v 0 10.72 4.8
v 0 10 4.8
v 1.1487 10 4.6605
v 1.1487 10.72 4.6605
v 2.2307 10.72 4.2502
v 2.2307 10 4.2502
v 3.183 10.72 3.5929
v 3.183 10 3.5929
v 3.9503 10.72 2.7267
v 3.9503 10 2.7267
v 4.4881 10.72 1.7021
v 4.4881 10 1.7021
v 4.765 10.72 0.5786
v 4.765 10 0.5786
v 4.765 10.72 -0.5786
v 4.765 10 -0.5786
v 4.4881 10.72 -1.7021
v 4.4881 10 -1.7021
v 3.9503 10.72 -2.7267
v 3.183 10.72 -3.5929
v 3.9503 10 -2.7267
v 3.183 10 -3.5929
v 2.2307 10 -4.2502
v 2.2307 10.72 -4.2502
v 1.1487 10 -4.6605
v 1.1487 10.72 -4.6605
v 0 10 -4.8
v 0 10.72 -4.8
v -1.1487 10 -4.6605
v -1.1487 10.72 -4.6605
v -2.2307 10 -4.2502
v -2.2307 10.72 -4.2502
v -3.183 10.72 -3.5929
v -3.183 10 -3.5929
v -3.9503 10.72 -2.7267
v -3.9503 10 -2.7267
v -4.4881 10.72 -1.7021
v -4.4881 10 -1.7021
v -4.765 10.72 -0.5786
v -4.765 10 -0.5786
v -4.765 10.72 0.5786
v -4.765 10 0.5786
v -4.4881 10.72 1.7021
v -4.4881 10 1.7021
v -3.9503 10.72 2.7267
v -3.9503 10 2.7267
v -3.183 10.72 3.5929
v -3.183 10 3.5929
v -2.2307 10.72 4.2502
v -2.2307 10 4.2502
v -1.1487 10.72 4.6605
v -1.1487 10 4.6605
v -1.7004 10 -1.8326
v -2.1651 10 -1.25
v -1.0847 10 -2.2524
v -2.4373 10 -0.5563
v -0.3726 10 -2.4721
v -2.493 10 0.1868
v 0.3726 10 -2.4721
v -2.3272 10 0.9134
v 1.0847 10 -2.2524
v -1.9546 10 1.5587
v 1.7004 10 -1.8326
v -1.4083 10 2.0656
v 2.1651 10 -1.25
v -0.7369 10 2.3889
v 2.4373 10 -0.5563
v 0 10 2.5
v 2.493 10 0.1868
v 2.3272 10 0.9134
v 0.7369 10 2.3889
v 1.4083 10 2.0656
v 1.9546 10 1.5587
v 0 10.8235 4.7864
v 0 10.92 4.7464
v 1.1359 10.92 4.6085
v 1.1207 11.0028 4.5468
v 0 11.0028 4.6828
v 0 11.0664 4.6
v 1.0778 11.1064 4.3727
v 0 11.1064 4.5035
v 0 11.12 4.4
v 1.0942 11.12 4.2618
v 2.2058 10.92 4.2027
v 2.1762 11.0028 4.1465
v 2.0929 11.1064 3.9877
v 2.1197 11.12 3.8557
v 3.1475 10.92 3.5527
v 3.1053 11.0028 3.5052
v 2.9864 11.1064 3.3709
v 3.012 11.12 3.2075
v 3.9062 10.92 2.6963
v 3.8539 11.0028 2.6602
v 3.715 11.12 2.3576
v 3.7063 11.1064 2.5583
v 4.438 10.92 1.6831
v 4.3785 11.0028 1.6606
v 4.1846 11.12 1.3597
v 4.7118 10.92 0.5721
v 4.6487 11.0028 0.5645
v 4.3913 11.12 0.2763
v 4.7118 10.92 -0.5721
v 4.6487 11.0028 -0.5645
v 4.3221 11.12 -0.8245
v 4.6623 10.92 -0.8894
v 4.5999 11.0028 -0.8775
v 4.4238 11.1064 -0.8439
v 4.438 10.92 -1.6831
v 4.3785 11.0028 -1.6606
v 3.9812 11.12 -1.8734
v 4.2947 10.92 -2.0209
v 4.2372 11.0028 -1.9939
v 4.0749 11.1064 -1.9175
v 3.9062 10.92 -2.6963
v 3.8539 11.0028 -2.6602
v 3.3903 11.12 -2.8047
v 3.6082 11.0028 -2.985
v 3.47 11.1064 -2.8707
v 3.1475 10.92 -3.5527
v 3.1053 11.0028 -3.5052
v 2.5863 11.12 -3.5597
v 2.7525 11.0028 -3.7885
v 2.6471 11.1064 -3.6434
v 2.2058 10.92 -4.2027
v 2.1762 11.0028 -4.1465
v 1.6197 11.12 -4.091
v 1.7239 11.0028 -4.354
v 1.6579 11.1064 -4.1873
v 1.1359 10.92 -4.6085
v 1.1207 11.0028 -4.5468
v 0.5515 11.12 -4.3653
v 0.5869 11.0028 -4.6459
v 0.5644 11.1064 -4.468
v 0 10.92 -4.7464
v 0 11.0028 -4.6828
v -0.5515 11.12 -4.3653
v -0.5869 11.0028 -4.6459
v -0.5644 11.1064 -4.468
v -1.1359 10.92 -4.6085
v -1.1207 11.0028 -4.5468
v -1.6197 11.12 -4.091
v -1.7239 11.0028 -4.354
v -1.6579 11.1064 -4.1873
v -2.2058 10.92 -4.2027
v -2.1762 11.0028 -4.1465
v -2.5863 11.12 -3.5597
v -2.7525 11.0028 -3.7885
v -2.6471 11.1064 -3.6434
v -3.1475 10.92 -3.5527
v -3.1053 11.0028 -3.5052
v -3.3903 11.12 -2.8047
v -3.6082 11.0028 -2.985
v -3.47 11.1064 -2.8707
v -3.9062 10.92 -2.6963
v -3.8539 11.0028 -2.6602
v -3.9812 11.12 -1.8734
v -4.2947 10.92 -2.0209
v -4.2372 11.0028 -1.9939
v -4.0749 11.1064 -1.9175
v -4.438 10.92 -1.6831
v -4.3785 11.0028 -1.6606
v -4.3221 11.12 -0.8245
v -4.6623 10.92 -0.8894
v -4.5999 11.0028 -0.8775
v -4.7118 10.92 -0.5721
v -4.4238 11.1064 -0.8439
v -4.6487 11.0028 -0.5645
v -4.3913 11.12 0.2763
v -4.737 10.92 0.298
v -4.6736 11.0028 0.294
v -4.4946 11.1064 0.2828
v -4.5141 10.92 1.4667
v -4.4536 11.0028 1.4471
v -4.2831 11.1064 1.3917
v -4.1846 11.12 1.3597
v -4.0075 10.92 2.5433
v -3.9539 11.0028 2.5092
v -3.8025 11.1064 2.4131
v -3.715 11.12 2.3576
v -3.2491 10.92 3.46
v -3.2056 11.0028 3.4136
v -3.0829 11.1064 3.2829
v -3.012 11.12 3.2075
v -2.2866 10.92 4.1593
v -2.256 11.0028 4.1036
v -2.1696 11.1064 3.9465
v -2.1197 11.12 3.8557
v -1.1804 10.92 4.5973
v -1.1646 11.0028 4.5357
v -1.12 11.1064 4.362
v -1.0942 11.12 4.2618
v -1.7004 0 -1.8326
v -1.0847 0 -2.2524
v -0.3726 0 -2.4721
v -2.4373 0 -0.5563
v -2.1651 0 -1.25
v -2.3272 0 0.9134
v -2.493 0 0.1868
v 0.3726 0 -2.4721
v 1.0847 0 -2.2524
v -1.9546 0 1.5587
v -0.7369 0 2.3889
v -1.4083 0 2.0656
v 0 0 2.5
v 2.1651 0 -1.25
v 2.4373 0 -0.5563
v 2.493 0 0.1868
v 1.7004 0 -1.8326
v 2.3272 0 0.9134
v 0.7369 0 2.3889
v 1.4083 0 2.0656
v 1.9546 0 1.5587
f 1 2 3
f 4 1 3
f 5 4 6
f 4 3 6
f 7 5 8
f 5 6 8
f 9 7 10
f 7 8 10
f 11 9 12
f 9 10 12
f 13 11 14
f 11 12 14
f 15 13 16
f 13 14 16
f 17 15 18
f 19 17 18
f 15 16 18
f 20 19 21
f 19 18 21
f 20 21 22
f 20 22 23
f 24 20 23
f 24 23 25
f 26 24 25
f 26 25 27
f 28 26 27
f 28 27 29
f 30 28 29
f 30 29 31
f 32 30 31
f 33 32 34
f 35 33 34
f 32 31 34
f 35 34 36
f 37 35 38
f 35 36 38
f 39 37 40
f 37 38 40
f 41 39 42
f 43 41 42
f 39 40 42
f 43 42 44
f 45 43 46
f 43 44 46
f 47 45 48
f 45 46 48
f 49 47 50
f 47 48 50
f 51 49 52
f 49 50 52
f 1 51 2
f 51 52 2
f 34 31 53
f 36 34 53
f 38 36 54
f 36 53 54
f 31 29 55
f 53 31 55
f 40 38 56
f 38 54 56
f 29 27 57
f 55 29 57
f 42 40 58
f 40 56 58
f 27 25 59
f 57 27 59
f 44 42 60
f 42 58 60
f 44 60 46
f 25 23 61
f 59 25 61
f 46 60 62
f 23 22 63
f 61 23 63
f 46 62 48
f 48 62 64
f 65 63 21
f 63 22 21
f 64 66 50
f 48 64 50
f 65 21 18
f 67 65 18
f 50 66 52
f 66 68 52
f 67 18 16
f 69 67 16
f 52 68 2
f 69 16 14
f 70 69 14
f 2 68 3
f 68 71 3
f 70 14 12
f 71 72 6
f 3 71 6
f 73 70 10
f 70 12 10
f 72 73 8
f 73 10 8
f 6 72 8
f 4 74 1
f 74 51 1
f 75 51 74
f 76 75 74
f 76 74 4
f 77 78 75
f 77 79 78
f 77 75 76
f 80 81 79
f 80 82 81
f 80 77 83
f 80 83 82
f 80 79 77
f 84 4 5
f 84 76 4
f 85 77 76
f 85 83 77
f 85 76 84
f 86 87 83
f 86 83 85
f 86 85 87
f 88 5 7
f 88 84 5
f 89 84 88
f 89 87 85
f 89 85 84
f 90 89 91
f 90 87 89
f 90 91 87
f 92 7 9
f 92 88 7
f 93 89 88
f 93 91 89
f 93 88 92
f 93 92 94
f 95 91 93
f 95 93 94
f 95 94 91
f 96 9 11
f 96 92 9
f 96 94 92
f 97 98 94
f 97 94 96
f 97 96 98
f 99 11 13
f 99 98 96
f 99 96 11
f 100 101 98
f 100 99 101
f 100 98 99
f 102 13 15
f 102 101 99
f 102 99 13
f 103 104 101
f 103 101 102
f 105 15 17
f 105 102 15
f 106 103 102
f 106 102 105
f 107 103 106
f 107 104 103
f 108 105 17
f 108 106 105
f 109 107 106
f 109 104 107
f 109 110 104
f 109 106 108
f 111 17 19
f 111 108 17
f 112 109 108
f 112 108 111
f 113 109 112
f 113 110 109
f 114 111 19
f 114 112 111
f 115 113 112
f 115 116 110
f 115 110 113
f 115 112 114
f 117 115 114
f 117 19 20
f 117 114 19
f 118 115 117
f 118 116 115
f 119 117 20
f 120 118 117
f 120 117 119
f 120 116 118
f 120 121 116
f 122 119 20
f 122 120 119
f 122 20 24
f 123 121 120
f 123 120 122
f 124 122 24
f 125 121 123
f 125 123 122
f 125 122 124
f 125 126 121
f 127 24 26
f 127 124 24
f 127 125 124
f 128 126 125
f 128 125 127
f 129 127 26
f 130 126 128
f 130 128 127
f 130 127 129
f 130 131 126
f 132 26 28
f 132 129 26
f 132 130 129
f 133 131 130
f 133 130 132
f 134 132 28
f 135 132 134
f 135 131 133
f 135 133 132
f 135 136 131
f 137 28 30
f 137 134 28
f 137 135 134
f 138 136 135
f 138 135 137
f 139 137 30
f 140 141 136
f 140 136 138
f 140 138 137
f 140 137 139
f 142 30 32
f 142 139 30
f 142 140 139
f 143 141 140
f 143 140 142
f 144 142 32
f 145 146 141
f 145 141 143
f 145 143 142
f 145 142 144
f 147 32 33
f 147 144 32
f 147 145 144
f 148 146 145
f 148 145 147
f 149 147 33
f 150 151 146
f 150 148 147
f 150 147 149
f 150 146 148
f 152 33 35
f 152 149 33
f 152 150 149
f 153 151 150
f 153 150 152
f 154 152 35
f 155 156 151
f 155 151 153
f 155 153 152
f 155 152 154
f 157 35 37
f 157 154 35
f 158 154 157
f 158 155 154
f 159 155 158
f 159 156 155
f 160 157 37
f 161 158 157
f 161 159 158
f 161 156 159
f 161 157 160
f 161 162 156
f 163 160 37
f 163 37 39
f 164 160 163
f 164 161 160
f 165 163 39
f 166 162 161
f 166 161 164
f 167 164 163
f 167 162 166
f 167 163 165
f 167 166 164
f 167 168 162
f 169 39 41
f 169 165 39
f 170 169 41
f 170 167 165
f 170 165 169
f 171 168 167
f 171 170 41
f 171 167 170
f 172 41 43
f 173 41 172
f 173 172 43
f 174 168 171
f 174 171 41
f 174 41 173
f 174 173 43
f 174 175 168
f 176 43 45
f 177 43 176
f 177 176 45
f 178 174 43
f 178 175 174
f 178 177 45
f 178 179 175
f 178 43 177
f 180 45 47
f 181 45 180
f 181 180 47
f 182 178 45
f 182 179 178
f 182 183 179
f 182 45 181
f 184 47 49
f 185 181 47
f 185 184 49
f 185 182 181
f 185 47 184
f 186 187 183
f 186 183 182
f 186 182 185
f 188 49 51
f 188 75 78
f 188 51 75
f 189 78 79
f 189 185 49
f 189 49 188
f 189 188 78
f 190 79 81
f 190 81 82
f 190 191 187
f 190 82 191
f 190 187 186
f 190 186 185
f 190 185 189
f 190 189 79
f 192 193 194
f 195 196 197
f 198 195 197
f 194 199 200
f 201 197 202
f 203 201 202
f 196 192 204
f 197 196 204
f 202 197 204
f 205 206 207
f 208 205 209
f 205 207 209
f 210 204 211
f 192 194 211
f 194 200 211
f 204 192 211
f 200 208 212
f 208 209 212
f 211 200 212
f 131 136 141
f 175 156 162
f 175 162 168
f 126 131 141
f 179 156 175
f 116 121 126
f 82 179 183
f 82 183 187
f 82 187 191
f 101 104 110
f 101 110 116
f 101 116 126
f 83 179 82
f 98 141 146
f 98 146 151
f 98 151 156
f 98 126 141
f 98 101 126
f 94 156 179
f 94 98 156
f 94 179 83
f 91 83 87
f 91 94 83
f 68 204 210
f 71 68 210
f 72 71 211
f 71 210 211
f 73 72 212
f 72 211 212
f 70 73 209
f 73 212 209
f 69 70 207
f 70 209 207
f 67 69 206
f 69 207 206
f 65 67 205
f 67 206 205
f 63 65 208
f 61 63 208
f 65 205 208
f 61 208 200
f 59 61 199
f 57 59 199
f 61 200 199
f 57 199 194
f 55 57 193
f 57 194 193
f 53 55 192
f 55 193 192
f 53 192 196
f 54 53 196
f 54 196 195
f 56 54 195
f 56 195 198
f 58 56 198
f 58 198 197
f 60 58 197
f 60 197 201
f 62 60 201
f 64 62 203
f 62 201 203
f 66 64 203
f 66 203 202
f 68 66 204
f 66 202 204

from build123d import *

# Parameters (mm, degrees)
SKETCH1_R           = 2.5
BOSS_EXTRUDE1_DEPTH = 10
SKETCH2_R           = 4.8
BOSS_EXTRUDE2_DEPTH = 1.12
FILLET2_R           = 0.4


with BuildPart() as part:
    # Sketch1 → Boss-Extrude1 (new body)
    with BuildSketch(Plane(origin=(0, 0, 0), x_dir=(1, 0, 0), z_dir=(0, 1, 0))):
        Circle(SKETCH1_R)
    extrude(amount=BOSS_EXTRUDE1_DEPTH)

    # Sketch2 → Boss-Extrude2 (add)
    with BuildSketch(Plane(origin=(0, 10, 0), x_dir=(1, 0, 0), z_dir=(0, 1, 0))):
        Circle(SKETCH2_R)
    extrude(amount=BOSS_EXTRUDE2_DEPTH)

    # Fillet2
    fillet2_edges = [part.edges().sort_by_distance(p)[0] for p in [
        (-4.8, 11.12, 0),
    ]]
    fillet(fillet2_edges, radius=FILLET2_R)


solid = part.part
